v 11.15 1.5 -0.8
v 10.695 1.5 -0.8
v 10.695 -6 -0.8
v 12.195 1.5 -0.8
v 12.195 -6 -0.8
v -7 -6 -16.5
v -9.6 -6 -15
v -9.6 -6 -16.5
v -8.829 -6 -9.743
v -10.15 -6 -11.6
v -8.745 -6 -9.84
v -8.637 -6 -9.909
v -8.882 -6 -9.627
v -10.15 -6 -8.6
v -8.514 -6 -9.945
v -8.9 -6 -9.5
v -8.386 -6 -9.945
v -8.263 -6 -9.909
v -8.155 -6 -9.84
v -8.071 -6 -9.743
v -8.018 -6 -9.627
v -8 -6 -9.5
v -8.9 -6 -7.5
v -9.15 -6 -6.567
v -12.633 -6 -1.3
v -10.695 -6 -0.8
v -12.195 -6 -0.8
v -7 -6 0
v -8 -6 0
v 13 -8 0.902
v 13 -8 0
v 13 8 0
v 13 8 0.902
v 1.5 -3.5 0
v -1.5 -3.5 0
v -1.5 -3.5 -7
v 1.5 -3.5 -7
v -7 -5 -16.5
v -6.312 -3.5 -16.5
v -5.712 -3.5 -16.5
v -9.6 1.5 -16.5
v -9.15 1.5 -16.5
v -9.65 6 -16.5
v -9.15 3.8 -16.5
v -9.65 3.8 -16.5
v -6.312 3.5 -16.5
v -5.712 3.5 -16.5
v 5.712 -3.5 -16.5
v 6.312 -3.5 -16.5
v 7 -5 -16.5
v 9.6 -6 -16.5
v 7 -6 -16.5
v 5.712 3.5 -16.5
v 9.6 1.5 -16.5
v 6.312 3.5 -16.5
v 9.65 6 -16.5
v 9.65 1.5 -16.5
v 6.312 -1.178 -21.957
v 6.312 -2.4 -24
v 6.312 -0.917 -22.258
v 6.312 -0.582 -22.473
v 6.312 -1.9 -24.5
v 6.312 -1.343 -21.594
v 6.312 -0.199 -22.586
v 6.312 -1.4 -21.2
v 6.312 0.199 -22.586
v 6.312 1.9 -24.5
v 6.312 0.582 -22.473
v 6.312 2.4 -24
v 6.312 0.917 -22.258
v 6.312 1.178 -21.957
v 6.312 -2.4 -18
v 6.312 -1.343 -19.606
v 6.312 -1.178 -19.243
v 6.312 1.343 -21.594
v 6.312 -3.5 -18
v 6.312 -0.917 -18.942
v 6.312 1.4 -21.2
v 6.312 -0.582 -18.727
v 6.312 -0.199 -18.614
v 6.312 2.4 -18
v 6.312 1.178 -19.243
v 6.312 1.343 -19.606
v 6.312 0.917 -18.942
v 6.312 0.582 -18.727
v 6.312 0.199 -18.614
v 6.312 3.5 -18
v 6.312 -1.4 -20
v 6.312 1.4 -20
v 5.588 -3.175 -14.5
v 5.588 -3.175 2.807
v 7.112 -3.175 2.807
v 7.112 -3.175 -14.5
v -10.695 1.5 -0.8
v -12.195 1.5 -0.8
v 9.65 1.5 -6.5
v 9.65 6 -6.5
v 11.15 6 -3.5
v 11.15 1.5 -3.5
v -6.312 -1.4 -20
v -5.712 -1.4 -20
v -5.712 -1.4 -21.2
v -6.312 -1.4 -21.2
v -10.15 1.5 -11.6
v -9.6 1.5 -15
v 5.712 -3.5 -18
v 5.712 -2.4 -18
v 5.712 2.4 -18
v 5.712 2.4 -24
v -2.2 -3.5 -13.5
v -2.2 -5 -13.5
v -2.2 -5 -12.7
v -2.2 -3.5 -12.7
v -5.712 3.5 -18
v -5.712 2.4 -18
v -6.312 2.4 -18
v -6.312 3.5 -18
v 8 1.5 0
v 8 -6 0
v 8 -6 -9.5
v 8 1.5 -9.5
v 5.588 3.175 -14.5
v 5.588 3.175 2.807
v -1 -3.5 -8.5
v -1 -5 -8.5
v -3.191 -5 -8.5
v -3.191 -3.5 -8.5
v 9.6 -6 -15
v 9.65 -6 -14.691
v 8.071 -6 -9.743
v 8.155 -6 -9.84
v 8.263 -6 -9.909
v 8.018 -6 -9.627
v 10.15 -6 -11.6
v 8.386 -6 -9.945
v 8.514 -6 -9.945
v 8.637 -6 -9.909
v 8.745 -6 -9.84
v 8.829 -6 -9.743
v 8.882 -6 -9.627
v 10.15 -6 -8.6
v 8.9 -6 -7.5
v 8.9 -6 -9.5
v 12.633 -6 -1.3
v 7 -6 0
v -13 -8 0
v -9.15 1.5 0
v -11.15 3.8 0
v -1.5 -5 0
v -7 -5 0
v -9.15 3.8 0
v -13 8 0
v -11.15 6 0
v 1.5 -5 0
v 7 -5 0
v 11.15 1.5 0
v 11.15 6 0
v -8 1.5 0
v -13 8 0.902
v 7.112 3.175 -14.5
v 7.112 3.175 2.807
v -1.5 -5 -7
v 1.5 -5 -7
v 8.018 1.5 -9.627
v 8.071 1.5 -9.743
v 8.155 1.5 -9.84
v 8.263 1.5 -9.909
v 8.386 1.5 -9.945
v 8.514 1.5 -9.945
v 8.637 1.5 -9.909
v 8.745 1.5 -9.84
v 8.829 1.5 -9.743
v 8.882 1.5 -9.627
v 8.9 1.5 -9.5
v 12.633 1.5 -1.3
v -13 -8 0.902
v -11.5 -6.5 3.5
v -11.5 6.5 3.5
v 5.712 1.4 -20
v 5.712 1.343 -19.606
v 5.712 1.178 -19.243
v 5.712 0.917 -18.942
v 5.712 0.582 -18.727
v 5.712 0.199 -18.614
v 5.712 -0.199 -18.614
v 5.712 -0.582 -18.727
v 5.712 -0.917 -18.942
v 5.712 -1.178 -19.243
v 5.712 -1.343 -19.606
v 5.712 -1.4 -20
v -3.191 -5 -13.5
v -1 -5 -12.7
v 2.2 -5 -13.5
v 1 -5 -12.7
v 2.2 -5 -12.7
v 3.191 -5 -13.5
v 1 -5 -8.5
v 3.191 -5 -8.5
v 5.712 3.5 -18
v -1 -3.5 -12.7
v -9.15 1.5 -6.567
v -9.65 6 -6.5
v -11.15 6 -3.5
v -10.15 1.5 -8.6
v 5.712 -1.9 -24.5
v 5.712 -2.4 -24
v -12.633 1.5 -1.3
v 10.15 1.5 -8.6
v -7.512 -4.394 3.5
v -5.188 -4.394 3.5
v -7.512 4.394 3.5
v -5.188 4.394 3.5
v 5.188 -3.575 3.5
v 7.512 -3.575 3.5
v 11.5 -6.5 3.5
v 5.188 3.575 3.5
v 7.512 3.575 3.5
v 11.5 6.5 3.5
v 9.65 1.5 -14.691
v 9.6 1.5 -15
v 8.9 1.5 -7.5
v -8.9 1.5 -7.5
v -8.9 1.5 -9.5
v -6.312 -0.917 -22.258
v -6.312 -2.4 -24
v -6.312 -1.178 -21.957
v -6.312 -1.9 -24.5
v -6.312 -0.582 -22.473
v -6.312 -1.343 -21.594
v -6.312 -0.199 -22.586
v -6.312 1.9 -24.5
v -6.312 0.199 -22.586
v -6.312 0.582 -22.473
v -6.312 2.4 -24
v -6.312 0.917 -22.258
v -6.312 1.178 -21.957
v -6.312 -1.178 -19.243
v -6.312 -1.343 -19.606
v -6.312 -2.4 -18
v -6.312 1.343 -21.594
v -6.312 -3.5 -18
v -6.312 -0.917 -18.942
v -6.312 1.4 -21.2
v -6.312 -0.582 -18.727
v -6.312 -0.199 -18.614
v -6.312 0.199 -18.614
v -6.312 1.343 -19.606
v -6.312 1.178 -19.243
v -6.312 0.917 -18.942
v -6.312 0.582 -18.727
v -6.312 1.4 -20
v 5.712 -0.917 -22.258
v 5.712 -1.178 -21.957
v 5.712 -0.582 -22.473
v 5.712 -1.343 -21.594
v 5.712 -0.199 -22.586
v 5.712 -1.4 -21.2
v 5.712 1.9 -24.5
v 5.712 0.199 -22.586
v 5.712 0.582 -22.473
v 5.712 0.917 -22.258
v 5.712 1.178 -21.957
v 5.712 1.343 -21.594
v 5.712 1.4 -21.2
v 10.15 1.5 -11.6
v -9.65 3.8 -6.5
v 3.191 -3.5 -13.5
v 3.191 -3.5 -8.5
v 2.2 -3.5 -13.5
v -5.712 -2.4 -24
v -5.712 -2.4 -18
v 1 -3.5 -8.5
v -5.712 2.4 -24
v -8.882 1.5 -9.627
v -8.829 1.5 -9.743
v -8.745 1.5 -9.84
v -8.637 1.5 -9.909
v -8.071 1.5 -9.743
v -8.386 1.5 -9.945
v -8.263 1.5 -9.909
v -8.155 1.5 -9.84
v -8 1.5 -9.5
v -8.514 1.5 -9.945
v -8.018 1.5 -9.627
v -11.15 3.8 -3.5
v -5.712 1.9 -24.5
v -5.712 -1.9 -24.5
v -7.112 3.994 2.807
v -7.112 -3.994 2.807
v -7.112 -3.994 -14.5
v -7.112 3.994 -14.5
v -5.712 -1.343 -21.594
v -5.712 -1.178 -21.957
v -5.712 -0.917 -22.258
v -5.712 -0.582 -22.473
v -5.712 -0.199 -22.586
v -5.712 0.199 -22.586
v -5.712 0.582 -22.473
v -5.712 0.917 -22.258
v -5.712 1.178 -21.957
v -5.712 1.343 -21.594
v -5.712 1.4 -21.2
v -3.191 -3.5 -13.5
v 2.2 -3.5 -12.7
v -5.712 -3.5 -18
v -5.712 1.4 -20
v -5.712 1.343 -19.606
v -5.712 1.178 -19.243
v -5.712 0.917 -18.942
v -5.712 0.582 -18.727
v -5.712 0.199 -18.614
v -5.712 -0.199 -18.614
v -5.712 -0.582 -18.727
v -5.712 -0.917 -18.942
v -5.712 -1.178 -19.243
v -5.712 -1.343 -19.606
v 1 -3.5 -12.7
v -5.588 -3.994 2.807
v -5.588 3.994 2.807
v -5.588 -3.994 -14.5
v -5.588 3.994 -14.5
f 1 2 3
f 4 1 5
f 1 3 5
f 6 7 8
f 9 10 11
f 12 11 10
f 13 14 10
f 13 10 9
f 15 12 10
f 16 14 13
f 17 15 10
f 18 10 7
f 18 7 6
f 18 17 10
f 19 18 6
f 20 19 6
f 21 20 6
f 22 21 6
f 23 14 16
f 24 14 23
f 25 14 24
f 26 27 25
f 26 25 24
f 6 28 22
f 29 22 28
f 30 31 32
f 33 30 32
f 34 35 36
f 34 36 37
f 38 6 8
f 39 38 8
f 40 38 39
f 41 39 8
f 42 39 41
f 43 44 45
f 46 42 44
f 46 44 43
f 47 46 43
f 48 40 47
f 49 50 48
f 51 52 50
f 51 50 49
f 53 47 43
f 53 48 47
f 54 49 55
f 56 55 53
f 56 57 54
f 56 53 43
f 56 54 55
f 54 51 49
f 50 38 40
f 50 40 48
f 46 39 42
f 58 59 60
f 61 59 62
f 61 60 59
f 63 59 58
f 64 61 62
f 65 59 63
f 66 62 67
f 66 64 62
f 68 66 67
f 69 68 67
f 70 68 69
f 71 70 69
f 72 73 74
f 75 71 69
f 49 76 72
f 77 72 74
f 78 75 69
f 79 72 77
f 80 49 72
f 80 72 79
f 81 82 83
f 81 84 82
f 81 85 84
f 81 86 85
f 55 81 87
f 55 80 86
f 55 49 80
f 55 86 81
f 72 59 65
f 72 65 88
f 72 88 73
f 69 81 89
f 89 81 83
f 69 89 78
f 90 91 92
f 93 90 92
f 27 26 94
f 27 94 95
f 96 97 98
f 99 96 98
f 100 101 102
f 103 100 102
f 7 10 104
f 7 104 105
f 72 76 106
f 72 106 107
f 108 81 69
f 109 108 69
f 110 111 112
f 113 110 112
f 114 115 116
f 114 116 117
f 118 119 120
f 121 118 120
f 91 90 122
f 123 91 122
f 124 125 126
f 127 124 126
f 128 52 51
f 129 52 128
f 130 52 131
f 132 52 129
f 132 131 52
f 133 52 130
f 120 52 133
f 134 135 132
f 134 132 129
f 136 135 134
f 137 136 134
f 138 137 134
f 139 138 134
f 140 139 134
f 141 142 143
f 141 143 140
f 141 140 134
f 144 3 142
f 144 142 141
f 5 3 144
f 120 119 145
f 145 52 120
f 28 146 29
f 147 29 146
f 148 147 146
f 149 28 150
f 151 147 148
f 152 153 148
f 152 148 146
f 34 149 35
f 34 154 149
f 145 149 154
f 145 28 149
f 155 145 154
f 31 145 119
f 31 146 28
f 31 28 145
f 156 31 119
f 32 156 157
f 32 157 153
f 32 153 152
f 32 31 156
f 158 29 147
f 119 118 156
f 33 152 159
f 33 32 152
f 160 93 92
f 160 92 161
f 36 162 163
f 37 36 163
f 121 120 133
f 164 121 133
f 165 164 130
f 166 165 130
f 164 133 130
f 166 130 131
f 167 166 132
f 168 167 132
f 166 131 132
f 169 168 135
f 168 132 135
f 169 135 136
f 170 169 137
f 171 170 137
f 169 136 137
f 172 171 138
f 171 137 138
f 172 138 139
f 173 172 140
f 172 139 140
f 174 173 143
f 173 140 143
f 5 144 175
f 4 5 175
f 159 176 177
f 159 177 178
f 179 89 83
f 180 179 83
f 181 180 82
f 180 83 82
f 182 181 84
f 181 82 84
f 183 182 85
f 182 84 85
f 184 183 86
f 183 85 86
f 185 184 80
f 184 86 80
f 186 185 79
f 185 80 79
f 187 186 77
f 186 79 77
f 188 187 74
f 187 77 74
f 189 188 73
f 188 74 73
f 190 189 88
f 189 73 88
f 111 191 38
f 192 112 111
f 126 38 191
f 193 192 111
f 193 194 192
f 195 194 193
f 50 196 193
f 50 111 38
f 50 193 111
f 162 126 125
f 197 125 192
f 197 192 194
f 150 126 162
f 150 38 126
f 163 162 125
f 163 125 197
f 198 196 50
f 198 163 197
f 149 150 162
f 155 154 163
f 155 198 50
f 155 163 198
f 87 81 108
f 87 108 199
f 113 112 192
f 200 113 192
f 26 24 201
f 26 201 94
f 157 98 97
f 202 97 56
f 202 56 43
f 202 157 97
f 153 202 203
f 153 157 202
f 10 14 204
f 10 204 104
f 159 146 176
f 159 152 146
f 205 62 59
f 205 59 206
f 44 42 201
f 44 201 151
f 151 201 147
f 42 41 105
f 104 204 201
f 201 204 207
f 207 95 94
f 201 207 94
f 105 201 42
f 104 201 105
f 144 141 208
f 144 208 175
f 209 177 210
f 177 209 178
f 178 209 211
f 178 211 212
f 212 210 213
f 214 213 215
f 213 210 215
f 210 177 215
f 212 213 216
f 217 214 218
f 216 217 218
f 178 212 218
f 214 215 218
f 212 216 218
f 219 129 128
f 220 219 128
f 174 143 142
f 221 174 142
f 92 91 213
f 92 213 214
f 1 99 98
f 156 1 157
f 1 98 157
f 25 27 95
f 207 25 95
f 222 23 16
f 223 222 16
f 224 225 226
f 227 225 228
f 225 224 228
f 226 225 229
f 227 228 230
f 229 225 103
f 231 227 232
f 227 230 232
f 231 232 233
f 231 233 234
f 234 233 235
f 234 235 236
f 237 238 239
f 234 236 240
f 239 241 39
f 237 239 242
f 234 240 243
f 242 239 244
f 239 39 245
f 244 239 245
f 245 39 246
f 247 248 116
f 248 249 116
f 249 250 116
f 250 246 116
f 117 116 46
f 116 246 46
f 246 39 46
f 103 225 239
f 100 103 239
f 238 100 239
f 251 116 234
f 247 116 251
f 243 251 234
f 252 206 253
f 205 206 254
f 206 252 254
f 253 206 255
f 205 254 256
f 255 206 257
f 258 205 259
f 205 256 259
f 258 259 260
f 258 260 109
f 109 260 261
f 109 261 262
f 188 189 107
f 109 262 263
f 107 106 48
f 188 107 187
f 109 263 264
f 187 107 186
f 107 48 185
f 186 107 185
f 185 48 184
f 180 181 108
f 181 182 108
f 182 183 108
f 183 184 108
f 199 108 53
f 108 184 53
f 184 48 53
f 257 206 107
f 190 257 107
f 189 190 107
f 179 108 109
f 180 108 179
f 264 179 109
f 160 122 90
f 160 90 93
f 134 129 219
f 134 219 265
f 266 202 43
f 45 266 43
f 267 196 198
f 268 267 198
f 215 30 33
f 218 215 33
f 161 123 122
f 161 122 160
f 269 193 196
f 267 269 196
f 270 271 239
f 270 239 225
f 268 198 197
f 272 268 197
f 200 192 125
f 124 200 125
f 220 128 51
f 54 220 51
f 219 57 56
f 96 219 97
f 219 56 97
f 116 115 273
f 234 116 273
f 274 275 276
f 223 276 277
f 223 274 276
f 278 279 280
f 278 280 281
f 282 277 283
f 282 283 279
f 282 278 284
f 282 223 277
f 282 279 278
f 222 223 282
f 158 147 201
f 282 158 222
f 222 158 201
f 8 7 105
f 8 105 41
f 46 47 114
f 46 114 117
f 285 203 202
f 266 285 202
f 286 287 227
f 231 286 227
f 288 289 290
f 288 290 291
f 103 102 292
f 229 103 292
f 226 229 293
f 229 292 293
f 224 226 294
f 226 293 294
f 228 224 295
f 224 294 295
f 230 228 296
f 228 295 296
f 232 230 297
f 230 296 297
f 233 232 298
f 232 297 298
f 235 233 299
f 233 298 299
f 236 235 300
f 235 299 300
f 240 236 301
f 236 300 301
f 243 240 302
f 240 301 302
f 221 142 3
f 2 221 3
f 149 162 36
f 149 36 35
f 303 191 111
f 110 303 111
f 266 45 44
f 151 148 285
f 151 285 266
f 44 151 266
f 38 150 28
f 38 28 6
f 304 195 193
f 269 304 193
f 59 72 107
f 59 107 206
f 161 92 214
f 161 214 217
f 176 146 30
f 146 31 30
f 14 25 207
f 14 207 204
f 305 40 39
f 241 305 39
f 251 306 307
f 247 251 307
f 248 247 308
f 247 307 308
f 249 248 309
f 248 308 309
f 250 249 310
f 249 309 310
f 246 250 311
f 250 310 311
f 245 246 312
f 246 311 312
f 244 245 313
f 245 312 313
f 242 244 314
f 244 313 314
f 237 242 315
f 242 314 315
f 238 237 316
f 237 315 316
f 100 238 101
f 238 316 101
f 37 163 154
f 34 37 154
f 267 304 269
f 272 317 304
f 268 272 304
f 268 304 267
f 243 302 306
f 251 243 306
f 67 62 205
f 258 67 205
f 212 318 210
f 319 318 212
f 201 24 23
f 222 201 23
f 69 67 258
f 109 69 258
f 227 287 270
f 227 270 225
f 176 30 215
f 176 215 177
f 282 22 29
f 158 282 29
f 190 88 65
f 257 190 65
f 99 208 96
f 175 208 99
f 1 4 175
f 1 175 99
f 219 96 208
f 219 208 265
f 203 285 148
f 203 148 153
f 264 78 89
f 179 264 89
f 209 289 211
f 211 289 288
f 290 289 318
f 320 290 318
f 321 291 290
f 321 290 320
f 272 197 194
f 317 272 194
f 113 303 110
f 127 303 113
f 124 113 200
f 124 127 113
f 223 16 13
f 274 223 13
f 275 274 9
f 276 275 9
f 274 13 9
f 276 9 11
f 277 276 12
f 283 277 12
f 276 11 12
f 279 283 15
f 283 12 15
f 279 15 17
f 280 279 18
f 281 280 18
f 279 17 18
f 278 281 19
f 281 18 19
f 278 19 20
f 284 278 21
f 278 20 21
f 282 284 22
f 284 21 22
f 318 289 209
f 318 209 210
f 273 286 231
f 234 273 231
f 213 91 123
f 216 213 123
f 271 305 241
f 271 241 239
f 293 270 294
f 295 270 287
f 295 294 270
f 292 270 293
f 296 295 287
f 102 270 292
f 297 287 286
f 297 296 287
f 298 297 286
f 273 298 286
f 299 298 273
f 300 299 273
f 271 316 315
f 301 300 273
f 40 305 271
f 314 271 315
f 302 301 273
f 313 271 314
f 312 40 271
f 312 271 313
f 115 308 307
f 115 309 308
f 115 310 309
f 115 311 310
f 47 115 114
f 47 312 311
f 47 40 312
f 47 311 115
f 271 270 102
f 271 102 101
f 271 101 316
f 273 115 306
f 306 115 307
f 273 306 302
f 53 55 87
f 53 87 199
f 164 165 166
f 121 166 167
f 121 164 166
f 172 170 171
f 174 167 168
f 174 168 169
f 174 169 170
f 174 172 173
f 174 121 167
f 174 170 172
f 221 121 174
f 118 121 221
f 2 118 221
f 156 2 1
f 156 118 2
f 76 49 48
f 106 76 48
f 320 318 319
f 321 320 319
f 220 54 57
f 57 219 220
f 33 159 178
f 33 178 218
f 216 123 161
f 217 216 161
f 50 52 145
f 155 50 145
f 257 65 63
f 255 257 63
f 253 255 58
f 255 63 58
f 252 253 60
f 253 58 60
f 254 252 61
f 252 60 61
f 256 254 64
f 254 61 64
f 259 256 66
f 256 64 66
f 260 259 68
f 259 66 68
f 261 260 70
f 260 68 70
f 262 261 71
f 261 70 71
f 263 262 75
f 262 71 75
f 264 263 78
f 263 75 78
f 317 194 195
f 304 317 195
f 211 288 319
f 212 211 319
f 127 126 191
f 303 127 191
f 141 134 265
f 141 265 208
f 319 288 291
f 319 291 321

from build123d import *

# Parameters (mm, degrees)
BOSS_EXTRUDE1_DEPTH = 16
SKETCH2_W           = 1.5
SKETCH2_H           = 16
BOSS_EXTRUDE2_DEPTH = 0.8
SKETCH3_W           = 16.5
SKETCH3_H           = 16
BOSS_EXTRUDE3_DEPTH = 20.8
SKETCH4_W           = 24.15
SKETCH4_H           = 16
BOSS_EXTRUDE4_DEPTH = 3.5
CUT_EXTRUDE1_DEPTH  = 6.5
CUT_EXTRUDE2_DEPTH  = 2
CUT_EXTRUDE3_DEPTH  = 2
SKETCH8_W           = 3
SKETCH8_H           = 7
CUT_EXTRUDE4_DEPTH  = 2.5
CUT_EXTRUDE5_DEPTH  = 1
SKETCH10_W          = 3.5
SKETCH10_H          = 16
BOSS_EXTRUDE5_DEPTH = 1.85
SKETCH11_W          = 2
SKETCH11_H          = 16.5
CUT_EXTRUDE6_DEPTH  = 9.8
SKETCH12_W          = 16.5
SKETCH12_H          = 1
CUT_EXTRUDE7_DEPTH  = 5.5
BOSS_EXTRUDE6_DEPTH = 7.5
CUT_EXTRUDE8_DEPTH  = 7.5
CUT_EXTRUDE9_DEPTH  = 7.5
SKETCH16_W          = 0.6
SKETCH16_H          = 7
BOSS_EXTRUDE7_DEPTH = 8
SKETCH17_W          = 6.5
SKETCH17_H          = 1.1
CUT_EXTRUDE10_DEPTH = 33.205641493
SKETCH18_W          = 6.5
SKETCH18_H          = 1.1
CUT_EXTRUDE11_DEPTH = 33.205641493
SKETCH19_W          = 0.6
SKETCH19_H          = 7
BOSS_EXTRUDE8_DEPTH = 8
SKETCH20_W          = 6.5
SKETCH20_H          = 1.1
CUT_EXTRUDE12_DEPTH = 32.849473214
SKETCH21_W          = 6.5
SKETCH21_H          = 1.1
CUT_EXTRUDE13_DEPTH = 32.849473214
CUT_EXTRUDE14_REACH = 33.068
CUT_EXTRUDE15_REACH = 34.206
CUT_EXTRUDE16_DEPTH = 32.849473214
CUT_EXTRUDE17_DEPTH = 7.5
CUT_EXTRUDE18_DEPTH = 1.5
CUT_EXTRUDE19_DEPTH = 1.5
SKETCH28_W          = 1.524
SKETCH28_H          = 7.988
CUT_EXTRUDE20_DEPTH = 18
SKETCH29_W          = 1.524
SKETCH29_H          = 6.35
CUT_EXTRUDE21_DEPTH = 18
CHAMFER1_SIZE       = 0.5
CHAMFER2_SIZE       = 0.528136002
CHAMFER2_SIZE2      = 0.608008164
CHAMFER3_SIZE       = 0.4
CHAMFER3_SIZE2      = 0.692820323
CHAMFER4_SIZE       = 0.608008164
CHAMFER4_SIZE2      = 0.528136002
CHAMFER5_SIZE       = 1.5
CHAMFER5_SIZE2      = 2.598076211


with BuildPart() as part:
    # Sketch1 → Boss-Extrude1 (new body)
    with BuildSketch(Plane.XZ.offset(8)):
        Polygon((12.803267754, -0.8), (9.65, -0.8), (9.65, -14.690909091), (10.15, -11.6), (10.15, -8.6), align=None)
    extrude(amount=-BOSS_EXTRUDE1_DEPTH)

    # Sketch2 → Boss-Extrude2 (add)
    with BuildSketch(Plane.XY.offset(-0.8)):
        with Locations((10.4, 0)):
            Rectangle(SKETCH2_W, SKETCH2_H)
    extrude(amount=BOSS_EXTRUDE2_DEPTH)

    # Sketch3 → Boss-Extrude3 (add)
    with BuildSketch(Plane.ZY.offset(-9.65)):
        with Locations((-8.25, 0)):
            Rectangle(SKETCH3_W, SKETCH3_H)
    extrude(amount=BOSS_EXTRUDE3_DEPTH)

    # Sketch4 → Boss-Extrude4 (add)
    with BuildSketch(Plane.XY):
        with Locations((0.925, 0)):
            Rectangle(SKETCH4_W, SKETCH4_H)
    extrude(amount=BOSS_EXTRUDE4_DEPTH)

    # Sketch5 → Cut-Extrude1 (cut)
    with BuildSketch(Plane(origin=(0, 8, 0), x_dir=(-1, 0, 0), z_dir=(0, 1, 0))):
        Polygon((-9.65, -14.690909091), (-9.65, -6.5), (-11.15, -3.5), (-11.15, -0.8), (-12.803267754, -0.8), (-10.15, -8.6), (-10.15, -11.6), align=None)
    extrude(amount=-CUT_EXTRUDE1_DEPTH, mode=Mode.SUBTRACT)

    # Sketch6 → Cut-Extrude2 (cut)
    with BuildSketch(Plane(origin=(0, 8, 0), x_dir=(-1, 0, 0), z_dir=(0, 1, 0))):
        Polygon((-11.15, 0), (-11.15, -3.5), (-9.65, -6.5), (-9.65, -16.5), (11.15, -16.5), (11.15, 0), align=None)
    extrude(amount=-CUT_EXTRUDE2_DEPTH, mode=Mode.SUBTRACT)

    # Sketch7 → Cut-Extrude3 (cut)
    with BuildSketch(Plane.XZ.offset(8)):
        Polygon((11.15, -0.8), (11.15, 0), (-11.15, 0), (-11.15, -16.5), (9.65, -16.5), (9.65, -14.690909091), (10.15, -11.6), (10.15, -8.6), (12.803267754, -0.8), align=None)
    extrude(amount=-CUT_EXTRUDE3_DEPTH, mode=Mode.SUBTRACT)

    # Sketch8 → Cut-Extrude4 (cut)
    with BuildSketch(Plane.XZ.offset(6)):
        with Locations((0, -3.5)):
            Rectangle(SKETCH8_W, SKETCH8_H)
    extrude(amount=-CUT_EXTRUDE4_DEPTH, mode=Mode.SUBTRACT)

    # Sketch9 → Cut-Extrude5 (cut)
    with BuildSketch(Plane.XZ.offset(6)):
        Polygon((-1.5, -7), (-1.5, -16.5), (7, -16.5), (7, 0), (1.5, 0), (1.5, -7), align=None)
    extrude(amount=-CUT_EXTRUDE5_DEPTH, mode=Mode.SUBTRACT)

    # Sketch10 → Boss-Extrude5 (add)
    with BuildSketch(Plane.ZY.offset(11.15)):
        with Locations((1.75, 0)):
            Rectangle(SKETCH10_W, SKETCH10_H)
    extrude(amount=BOSS_EXTRUDE5_DEPTH)

    # Sketch11 → Cut-Extrude6 (cut)
    with BuildSketch(Plane.XZ.offset(6)):
        with Locations((-10.15, -8.25)):
            Rectangle(SKETCH11_W, SKETCH11_H)
    extrude(amount=-CUT_EXTRUDE6_DEPTH, mode=Mode.SUBTRACT)

    # Sketch12 → Cut-Extrude7 (cut)
    with BuildSketch(Plane(origin=(-1.5, 0, 0), x_dir=(0, 0, -1), z_dir=(1, 0, 0))):
        with Locations((8.25, -5.5)):
            Rectangle(SKETCH12_W, SKETCH12_H)
    extrude(amount=-CUT_EXTRUDE7_DEPTH, mode=Mode.SUBTRACT)

    # Sketch13 → Boss-Extrude6 (add)
    with BuildSketch(Plane.XZ.offset(6)):
        Polygon((-9.15, -6.566987298), (-10.695259589, -0.8), (-12.803267754, -0.8), (-10.15, -8.6), (-10.15, -11.6), (-9.6, -15), (-9.6, -16.5), (-9.15, -16.5), align=None)
    extrude(amount=-BOSS_EXTRUDE6_DEPTH)

    # Sketch14 → Cut-Extrude8 (cut)
    with BuildSketch(Plane.XZ.offset(6)):
        with BuildLine():
            Line((-9.15, 0), (-9.15, -6.566987298))
            Line((-9.15, -6.566987298), (-8.9, -7.5))
            Line((-8.9, -7.5), (-8.9, -9.5))
            ThreePointArc((-8.9, -9.5), (-8.45, -9.95), (-8, -9.5))
            Line((-8, -9.5), (-8, 0))
            Line((-8, 0), (-9.15, 0))
        make_face()
    extrude(amount=-CUT_EXTRUDE8_DEPTH, mode=Mode.SUBTRACT)

    # Sketch15 → Cut-Extrude9 (cut)
    with BuildSketch(Plane.XZ.offset(6)):
        with BuildLine():
            Line((8.9, -9.5), (8.9, -7.5))
            Line((8.9, -7.5), (10.695259589, -0.8))
            Line((10.695259589, -0.8), (11.15, -0.8))
            Line((11.15, -0.8), (11.15, 0))
            Line((11.15, 0), (8, 0))
            Line((8, 0), (8, -9.5))
            ThreePointArc((8, -9.5), (8.45, -9.95), (8.9, -9.5))
        make_face()
    extrude(amount=-CUT_EXTRUDE9_DEPTH, mode=Mode.SUBTRACT)

    # Sketch16 → Boss-Extrude7 (add)
    with BuildSketch(Plane(origin=(0, 0, -16.5), x_dir=(-1, 0, 0), z_dir=(0, 0, -1))):
        with Locations((-6.012, 0)):
            Rectangle(SKETCH16_W, SKETCH16_H)
    extrude(amount=BOSS_EXTRUDE7_DEPTH)

    # Sketch17 → Cut-Extrude10 (cut, through all)
    with BuildSketch(Plane(origin=(6.312, 0, 0), x_dir=(0, 0, -1), z_dir=(1, 0, 0))):
        with Locations((21.25, 2.95)):
            Rectangle(SKETCH17_W, SKETCH17_H)
    extrude(amount=-CUT_EXTRUDE10_DEPTH, mode=Mode.SUBTRACT)

    # Sketch18 → Cut-Extrude11 (cut, through all)
    with BuildSketch(Plane(origin=(6.312, 0, 0), x_dir=(0, 0, -1), z_dir=(1, 0, 0))):
        with Locations((21.25, -2.95)):
            Rectangle(SKETCH18_W, SKETCH18_H)
    extrude(amount=-CUT_EXTRUDE11_DEPTH, mode=Mode.SUBTRACT)

    # Sketch19 → Boss-Extrude8 (add)
    with BuildSketch(Plane(origin=(0, 0, -16.5), x_dir=(-1, 0, 0), z_dir=(0, 0, -1))):
        with Locations((6.012, 0)):
            Rectangle(SKETCH19_W, SKETCH19_H)
    extrude(amount=BOSS_EXTRUDE8_DEPTH)

    # Sketch20 → Cut-Extrude12 (cut, through all)
    with BuildSketch(Plane(origin=(-5.712, 0, 0), x_dir=(0, 0, -1), z_dir=(1, 0, 0))):
        with Locations((21.25, 2.95)):
            Rectangle(SKETCH20_W, SKETCH20_H)
    extrude(amount=-CUT_EXTRUDE12_DEPTH, mode=Mode.SUBTRACT)

    # Sketch21 → Cut-Extrude13 (cut, through all)
    with BuildSketch(Plane(origin=(-5.712, 0, 0), x_dir=(0, 0, -1), z_dir=(1, 0, 0))):
        with Locations((21.25, -2.95)):
            Rectangle(SKETCH21_W, SKETCH21_H)
    extrude(amount=-CUT_EXTRUDE13_DEPTH, mode=Mode.SUBTRACT)

    # Sketch22 → Cut-Extrude14 (cut, up to next)
    with BuildSketch(Plane(origin=(0, 6, 0), x_dir=(-1, 0, 0), z_dir=(0, 1, 0)), mode=Mode.PRIVATE) as cut_extrude14_sk1:
        Polygon((11.15, -3.5), (9.65, -6.5), (9.65, -16.5), (11.15, -16.5), align=None)
    cut_extrude14_tool1 = extrude(cut_extrude14_sk1.sketch, amount=-CUT_EXTRUDE14_REACH, mode=Mode.PRIVATE) & part.part
    add(cut_extrude14_tool1.solids().sort_by_distance((-10.432609, 6, -10.717391))[0], mode=Mode.SUBTRACT)

    # Sketch23 → Cut-Extrude15 (cut, up to next)
    with BuildSketch(Plane(origin=(6.312, 0, 0), x_dir=(0, 0, -1), z_dir=(1, 0, 0)), mode=Mode.PRIVATE) as cut_extrude15_sk1:
        with BuildLine():
            Line((20, -1.4), (21.2, -1.4))
            ThreePointArc((21.2, -1.4), (22.6, 0), (21.2, 1.4))
            Line((21.2, 1.4), (20, 1.4))
            ThreePointArc((20, 1.4), (18.6, 0), (20, -1.4))
        make_face()
    cut_extrude15_tool1 = extrude(cut_extrude15_sk1.sketch, amount=-CUT_EXTRUDE15_REACH, mode=Mode.PRIVATE) & part.part
    add(cut_extrude15_tool1.solids().sort_by_distance((6.312, 0, -20.6))[0], mode=Mode.SUBTRACT)

    # Sketch24 → Cut-Extrude16 (cut, through all)
    with BuildSketch(Plane(origin=(-5.712, 0, 0), x_dir=(0, 0, -1), z_dir=(1, 0, 0))):
        with BuildLine():
            Line((20, -1.4), (21.2, -1.4))
            ThreePointArc((21.2, -1.4), (22.6, 0), (21.2, 1.4))
            Line((21.2, 1.4), (20, 1.4))
            ThreePointArc((20, 1.4), (18.6, 0), (20, -1.4))
        make_face()
    extrude(amount=-CUT_EXTRUDE16_DEPTH, mode=Mode.SUBTRACT)

    # Sketch25 → Cut-Extrude17 (cut)
    with BuildSketch(Plane.XZ.offset(6)):
        Polygon((9.6, -15), (9.6, -16.5), (9.65, -16.5), (9.65, -14.690909091), align=None)
    extrude(amount=-CUT_EXTRUDE17_DEPTH, mode=Mode.SUBTRACT)

    # Sketch26 → Cut-Extrude18 (cut)
    with BuildSketch(Plane.XZ.offset(5)):
        Polygon((2.2, -13.5), (3.191, -13.5), (3.191, -8.5), (1, -8.5), (1, -12.7), (2.2, -12.7), align=None)
    extrude(amount=-CUT_EXTRUDE18_DEPTH, mode=Mode.SUBTRACT)

    # Sketch27 → Cut-Extrude19 (cut)
    with BuildSketch(Plane.XZ.offset(5)):
        Polygon((-2.2, -13.5), (-2.2, -12.7), (-1, -12.7), (-1, -8.5), (-3.191, -8.5), (-3.191, -13.5), align=None)
    extrude(amount=-CUT_EXTRUDE19_DEPTH, mode=Mode.SUBTRACT)

    # Sketch28 → Cut-Extrude20 (cut)
    with BuildSketch(Plane.XY.offset(3.5)):
        with Locations((-6.35, 0)):
            Rectangle(SKETCH28_W, SKETCH28_H)
    extrude(amount=-CUT_EXTRUDE20_DEPTH, mode=Mode.SUBTRACT)

    # Sketch29 → Cut-Extrude21 (cut)
    with BuildSketch(Plane.XY.offset(3.5)):
        with Locations((6.35, 0)):
            Rectangle(SKETCH29_W, SKETCH29_H)
    extrude(amount=-CUT_EXTRUDE21_DEPTH, mode=Mode.SUBTRACT)

    # Chamfer1
    chamfer1_edges = [part.edges().sort_by_distance(p)[0] for p in [
        (6.012, 2.4, -24.5),
        (6.012, -2.4, -24.5),
        (-6.012, 2.4, -24.5),
        (-6.012, -2.4, -24.5),
    ]]
    chamfer(chamfer1_edges, length=CHAMFER1_SIZE)

    # Chamfer2
    chamfer2_edges = [part.edges().sort_by_distance(p)[0] for p in [
        (-12.803267754, -2.25, -0.8),
    ]]
    chamfer2_side = [part.faces().sort_by_distance(p)[0] for p in [
        (-11.476633877, -2.25, -4.7),
    ]]
    chamfer(chamfer2_edges, length=CHAMFER2_SIZE, length2=CHAMFER2_SIZE2, reference=chamfer2_side[0])

    # Chamfer3
    chamfer3_edges = [part.edges().sort_by_distance(p)[0] for p in [
        (-6.35, -3.994, 3.5),
        (-5.588, 0, 3.5),
        (-6.35, 3.994, 3.5),
        (-7.112, 0, 3.5),
        (6.35, -3.175, 3.5),
        (7.112, 0, 3.5),
        (6.35, 3.175, 3.5),
        (5.588, 0, 3.5),
    ]]
    chamfer3_side = [part.faces().sort_by_distance(p)[0] for p in [
        (0.040217242, 0, 3.5),
    ]]
    chamfer(chamfer3_edges, length=CHAMFER3_SIZE, length2=CHAMFER3_SIZE2, reference=chamfer3_side[0])

    # Chamfer4
    chamfer4_edges = [part.edges().sort_by_distance(p)[0] for p in [
        (12.803267754, -2.25, -0.8),
    ]]
    chamfer4_side = [part.faces().sort_by_distance(p)[0] for p in [
        (11.749263671, -2.25, -0.8),
    ]]
    chamfer(chamfer4_edges, length=CHAMFER4_SIZE, length2=CHAMFER4_SIZE2, reference=chamfer4_side[0])

    # Chamfer5
    chamfer5_edges = [part.edges().sort_by_distance(p)[0] for p in [
        (-13, 0, 3.5),
        (0, -8, 3.5),
        (13, 0, 3.5),
        (0, 8, 3.5),
    ]]
    chamfer5_side = [part.faces().sort_by_distance(p)[0] for p in [
        (0.06378672, 0, 3.5),
    ]]
    chamfer(chamfer5_edges, length=CHAMFER5_SIZE, length2=CHAMFER5_SIZE2, reference=chamfer5_side[0])


solid = part.part
